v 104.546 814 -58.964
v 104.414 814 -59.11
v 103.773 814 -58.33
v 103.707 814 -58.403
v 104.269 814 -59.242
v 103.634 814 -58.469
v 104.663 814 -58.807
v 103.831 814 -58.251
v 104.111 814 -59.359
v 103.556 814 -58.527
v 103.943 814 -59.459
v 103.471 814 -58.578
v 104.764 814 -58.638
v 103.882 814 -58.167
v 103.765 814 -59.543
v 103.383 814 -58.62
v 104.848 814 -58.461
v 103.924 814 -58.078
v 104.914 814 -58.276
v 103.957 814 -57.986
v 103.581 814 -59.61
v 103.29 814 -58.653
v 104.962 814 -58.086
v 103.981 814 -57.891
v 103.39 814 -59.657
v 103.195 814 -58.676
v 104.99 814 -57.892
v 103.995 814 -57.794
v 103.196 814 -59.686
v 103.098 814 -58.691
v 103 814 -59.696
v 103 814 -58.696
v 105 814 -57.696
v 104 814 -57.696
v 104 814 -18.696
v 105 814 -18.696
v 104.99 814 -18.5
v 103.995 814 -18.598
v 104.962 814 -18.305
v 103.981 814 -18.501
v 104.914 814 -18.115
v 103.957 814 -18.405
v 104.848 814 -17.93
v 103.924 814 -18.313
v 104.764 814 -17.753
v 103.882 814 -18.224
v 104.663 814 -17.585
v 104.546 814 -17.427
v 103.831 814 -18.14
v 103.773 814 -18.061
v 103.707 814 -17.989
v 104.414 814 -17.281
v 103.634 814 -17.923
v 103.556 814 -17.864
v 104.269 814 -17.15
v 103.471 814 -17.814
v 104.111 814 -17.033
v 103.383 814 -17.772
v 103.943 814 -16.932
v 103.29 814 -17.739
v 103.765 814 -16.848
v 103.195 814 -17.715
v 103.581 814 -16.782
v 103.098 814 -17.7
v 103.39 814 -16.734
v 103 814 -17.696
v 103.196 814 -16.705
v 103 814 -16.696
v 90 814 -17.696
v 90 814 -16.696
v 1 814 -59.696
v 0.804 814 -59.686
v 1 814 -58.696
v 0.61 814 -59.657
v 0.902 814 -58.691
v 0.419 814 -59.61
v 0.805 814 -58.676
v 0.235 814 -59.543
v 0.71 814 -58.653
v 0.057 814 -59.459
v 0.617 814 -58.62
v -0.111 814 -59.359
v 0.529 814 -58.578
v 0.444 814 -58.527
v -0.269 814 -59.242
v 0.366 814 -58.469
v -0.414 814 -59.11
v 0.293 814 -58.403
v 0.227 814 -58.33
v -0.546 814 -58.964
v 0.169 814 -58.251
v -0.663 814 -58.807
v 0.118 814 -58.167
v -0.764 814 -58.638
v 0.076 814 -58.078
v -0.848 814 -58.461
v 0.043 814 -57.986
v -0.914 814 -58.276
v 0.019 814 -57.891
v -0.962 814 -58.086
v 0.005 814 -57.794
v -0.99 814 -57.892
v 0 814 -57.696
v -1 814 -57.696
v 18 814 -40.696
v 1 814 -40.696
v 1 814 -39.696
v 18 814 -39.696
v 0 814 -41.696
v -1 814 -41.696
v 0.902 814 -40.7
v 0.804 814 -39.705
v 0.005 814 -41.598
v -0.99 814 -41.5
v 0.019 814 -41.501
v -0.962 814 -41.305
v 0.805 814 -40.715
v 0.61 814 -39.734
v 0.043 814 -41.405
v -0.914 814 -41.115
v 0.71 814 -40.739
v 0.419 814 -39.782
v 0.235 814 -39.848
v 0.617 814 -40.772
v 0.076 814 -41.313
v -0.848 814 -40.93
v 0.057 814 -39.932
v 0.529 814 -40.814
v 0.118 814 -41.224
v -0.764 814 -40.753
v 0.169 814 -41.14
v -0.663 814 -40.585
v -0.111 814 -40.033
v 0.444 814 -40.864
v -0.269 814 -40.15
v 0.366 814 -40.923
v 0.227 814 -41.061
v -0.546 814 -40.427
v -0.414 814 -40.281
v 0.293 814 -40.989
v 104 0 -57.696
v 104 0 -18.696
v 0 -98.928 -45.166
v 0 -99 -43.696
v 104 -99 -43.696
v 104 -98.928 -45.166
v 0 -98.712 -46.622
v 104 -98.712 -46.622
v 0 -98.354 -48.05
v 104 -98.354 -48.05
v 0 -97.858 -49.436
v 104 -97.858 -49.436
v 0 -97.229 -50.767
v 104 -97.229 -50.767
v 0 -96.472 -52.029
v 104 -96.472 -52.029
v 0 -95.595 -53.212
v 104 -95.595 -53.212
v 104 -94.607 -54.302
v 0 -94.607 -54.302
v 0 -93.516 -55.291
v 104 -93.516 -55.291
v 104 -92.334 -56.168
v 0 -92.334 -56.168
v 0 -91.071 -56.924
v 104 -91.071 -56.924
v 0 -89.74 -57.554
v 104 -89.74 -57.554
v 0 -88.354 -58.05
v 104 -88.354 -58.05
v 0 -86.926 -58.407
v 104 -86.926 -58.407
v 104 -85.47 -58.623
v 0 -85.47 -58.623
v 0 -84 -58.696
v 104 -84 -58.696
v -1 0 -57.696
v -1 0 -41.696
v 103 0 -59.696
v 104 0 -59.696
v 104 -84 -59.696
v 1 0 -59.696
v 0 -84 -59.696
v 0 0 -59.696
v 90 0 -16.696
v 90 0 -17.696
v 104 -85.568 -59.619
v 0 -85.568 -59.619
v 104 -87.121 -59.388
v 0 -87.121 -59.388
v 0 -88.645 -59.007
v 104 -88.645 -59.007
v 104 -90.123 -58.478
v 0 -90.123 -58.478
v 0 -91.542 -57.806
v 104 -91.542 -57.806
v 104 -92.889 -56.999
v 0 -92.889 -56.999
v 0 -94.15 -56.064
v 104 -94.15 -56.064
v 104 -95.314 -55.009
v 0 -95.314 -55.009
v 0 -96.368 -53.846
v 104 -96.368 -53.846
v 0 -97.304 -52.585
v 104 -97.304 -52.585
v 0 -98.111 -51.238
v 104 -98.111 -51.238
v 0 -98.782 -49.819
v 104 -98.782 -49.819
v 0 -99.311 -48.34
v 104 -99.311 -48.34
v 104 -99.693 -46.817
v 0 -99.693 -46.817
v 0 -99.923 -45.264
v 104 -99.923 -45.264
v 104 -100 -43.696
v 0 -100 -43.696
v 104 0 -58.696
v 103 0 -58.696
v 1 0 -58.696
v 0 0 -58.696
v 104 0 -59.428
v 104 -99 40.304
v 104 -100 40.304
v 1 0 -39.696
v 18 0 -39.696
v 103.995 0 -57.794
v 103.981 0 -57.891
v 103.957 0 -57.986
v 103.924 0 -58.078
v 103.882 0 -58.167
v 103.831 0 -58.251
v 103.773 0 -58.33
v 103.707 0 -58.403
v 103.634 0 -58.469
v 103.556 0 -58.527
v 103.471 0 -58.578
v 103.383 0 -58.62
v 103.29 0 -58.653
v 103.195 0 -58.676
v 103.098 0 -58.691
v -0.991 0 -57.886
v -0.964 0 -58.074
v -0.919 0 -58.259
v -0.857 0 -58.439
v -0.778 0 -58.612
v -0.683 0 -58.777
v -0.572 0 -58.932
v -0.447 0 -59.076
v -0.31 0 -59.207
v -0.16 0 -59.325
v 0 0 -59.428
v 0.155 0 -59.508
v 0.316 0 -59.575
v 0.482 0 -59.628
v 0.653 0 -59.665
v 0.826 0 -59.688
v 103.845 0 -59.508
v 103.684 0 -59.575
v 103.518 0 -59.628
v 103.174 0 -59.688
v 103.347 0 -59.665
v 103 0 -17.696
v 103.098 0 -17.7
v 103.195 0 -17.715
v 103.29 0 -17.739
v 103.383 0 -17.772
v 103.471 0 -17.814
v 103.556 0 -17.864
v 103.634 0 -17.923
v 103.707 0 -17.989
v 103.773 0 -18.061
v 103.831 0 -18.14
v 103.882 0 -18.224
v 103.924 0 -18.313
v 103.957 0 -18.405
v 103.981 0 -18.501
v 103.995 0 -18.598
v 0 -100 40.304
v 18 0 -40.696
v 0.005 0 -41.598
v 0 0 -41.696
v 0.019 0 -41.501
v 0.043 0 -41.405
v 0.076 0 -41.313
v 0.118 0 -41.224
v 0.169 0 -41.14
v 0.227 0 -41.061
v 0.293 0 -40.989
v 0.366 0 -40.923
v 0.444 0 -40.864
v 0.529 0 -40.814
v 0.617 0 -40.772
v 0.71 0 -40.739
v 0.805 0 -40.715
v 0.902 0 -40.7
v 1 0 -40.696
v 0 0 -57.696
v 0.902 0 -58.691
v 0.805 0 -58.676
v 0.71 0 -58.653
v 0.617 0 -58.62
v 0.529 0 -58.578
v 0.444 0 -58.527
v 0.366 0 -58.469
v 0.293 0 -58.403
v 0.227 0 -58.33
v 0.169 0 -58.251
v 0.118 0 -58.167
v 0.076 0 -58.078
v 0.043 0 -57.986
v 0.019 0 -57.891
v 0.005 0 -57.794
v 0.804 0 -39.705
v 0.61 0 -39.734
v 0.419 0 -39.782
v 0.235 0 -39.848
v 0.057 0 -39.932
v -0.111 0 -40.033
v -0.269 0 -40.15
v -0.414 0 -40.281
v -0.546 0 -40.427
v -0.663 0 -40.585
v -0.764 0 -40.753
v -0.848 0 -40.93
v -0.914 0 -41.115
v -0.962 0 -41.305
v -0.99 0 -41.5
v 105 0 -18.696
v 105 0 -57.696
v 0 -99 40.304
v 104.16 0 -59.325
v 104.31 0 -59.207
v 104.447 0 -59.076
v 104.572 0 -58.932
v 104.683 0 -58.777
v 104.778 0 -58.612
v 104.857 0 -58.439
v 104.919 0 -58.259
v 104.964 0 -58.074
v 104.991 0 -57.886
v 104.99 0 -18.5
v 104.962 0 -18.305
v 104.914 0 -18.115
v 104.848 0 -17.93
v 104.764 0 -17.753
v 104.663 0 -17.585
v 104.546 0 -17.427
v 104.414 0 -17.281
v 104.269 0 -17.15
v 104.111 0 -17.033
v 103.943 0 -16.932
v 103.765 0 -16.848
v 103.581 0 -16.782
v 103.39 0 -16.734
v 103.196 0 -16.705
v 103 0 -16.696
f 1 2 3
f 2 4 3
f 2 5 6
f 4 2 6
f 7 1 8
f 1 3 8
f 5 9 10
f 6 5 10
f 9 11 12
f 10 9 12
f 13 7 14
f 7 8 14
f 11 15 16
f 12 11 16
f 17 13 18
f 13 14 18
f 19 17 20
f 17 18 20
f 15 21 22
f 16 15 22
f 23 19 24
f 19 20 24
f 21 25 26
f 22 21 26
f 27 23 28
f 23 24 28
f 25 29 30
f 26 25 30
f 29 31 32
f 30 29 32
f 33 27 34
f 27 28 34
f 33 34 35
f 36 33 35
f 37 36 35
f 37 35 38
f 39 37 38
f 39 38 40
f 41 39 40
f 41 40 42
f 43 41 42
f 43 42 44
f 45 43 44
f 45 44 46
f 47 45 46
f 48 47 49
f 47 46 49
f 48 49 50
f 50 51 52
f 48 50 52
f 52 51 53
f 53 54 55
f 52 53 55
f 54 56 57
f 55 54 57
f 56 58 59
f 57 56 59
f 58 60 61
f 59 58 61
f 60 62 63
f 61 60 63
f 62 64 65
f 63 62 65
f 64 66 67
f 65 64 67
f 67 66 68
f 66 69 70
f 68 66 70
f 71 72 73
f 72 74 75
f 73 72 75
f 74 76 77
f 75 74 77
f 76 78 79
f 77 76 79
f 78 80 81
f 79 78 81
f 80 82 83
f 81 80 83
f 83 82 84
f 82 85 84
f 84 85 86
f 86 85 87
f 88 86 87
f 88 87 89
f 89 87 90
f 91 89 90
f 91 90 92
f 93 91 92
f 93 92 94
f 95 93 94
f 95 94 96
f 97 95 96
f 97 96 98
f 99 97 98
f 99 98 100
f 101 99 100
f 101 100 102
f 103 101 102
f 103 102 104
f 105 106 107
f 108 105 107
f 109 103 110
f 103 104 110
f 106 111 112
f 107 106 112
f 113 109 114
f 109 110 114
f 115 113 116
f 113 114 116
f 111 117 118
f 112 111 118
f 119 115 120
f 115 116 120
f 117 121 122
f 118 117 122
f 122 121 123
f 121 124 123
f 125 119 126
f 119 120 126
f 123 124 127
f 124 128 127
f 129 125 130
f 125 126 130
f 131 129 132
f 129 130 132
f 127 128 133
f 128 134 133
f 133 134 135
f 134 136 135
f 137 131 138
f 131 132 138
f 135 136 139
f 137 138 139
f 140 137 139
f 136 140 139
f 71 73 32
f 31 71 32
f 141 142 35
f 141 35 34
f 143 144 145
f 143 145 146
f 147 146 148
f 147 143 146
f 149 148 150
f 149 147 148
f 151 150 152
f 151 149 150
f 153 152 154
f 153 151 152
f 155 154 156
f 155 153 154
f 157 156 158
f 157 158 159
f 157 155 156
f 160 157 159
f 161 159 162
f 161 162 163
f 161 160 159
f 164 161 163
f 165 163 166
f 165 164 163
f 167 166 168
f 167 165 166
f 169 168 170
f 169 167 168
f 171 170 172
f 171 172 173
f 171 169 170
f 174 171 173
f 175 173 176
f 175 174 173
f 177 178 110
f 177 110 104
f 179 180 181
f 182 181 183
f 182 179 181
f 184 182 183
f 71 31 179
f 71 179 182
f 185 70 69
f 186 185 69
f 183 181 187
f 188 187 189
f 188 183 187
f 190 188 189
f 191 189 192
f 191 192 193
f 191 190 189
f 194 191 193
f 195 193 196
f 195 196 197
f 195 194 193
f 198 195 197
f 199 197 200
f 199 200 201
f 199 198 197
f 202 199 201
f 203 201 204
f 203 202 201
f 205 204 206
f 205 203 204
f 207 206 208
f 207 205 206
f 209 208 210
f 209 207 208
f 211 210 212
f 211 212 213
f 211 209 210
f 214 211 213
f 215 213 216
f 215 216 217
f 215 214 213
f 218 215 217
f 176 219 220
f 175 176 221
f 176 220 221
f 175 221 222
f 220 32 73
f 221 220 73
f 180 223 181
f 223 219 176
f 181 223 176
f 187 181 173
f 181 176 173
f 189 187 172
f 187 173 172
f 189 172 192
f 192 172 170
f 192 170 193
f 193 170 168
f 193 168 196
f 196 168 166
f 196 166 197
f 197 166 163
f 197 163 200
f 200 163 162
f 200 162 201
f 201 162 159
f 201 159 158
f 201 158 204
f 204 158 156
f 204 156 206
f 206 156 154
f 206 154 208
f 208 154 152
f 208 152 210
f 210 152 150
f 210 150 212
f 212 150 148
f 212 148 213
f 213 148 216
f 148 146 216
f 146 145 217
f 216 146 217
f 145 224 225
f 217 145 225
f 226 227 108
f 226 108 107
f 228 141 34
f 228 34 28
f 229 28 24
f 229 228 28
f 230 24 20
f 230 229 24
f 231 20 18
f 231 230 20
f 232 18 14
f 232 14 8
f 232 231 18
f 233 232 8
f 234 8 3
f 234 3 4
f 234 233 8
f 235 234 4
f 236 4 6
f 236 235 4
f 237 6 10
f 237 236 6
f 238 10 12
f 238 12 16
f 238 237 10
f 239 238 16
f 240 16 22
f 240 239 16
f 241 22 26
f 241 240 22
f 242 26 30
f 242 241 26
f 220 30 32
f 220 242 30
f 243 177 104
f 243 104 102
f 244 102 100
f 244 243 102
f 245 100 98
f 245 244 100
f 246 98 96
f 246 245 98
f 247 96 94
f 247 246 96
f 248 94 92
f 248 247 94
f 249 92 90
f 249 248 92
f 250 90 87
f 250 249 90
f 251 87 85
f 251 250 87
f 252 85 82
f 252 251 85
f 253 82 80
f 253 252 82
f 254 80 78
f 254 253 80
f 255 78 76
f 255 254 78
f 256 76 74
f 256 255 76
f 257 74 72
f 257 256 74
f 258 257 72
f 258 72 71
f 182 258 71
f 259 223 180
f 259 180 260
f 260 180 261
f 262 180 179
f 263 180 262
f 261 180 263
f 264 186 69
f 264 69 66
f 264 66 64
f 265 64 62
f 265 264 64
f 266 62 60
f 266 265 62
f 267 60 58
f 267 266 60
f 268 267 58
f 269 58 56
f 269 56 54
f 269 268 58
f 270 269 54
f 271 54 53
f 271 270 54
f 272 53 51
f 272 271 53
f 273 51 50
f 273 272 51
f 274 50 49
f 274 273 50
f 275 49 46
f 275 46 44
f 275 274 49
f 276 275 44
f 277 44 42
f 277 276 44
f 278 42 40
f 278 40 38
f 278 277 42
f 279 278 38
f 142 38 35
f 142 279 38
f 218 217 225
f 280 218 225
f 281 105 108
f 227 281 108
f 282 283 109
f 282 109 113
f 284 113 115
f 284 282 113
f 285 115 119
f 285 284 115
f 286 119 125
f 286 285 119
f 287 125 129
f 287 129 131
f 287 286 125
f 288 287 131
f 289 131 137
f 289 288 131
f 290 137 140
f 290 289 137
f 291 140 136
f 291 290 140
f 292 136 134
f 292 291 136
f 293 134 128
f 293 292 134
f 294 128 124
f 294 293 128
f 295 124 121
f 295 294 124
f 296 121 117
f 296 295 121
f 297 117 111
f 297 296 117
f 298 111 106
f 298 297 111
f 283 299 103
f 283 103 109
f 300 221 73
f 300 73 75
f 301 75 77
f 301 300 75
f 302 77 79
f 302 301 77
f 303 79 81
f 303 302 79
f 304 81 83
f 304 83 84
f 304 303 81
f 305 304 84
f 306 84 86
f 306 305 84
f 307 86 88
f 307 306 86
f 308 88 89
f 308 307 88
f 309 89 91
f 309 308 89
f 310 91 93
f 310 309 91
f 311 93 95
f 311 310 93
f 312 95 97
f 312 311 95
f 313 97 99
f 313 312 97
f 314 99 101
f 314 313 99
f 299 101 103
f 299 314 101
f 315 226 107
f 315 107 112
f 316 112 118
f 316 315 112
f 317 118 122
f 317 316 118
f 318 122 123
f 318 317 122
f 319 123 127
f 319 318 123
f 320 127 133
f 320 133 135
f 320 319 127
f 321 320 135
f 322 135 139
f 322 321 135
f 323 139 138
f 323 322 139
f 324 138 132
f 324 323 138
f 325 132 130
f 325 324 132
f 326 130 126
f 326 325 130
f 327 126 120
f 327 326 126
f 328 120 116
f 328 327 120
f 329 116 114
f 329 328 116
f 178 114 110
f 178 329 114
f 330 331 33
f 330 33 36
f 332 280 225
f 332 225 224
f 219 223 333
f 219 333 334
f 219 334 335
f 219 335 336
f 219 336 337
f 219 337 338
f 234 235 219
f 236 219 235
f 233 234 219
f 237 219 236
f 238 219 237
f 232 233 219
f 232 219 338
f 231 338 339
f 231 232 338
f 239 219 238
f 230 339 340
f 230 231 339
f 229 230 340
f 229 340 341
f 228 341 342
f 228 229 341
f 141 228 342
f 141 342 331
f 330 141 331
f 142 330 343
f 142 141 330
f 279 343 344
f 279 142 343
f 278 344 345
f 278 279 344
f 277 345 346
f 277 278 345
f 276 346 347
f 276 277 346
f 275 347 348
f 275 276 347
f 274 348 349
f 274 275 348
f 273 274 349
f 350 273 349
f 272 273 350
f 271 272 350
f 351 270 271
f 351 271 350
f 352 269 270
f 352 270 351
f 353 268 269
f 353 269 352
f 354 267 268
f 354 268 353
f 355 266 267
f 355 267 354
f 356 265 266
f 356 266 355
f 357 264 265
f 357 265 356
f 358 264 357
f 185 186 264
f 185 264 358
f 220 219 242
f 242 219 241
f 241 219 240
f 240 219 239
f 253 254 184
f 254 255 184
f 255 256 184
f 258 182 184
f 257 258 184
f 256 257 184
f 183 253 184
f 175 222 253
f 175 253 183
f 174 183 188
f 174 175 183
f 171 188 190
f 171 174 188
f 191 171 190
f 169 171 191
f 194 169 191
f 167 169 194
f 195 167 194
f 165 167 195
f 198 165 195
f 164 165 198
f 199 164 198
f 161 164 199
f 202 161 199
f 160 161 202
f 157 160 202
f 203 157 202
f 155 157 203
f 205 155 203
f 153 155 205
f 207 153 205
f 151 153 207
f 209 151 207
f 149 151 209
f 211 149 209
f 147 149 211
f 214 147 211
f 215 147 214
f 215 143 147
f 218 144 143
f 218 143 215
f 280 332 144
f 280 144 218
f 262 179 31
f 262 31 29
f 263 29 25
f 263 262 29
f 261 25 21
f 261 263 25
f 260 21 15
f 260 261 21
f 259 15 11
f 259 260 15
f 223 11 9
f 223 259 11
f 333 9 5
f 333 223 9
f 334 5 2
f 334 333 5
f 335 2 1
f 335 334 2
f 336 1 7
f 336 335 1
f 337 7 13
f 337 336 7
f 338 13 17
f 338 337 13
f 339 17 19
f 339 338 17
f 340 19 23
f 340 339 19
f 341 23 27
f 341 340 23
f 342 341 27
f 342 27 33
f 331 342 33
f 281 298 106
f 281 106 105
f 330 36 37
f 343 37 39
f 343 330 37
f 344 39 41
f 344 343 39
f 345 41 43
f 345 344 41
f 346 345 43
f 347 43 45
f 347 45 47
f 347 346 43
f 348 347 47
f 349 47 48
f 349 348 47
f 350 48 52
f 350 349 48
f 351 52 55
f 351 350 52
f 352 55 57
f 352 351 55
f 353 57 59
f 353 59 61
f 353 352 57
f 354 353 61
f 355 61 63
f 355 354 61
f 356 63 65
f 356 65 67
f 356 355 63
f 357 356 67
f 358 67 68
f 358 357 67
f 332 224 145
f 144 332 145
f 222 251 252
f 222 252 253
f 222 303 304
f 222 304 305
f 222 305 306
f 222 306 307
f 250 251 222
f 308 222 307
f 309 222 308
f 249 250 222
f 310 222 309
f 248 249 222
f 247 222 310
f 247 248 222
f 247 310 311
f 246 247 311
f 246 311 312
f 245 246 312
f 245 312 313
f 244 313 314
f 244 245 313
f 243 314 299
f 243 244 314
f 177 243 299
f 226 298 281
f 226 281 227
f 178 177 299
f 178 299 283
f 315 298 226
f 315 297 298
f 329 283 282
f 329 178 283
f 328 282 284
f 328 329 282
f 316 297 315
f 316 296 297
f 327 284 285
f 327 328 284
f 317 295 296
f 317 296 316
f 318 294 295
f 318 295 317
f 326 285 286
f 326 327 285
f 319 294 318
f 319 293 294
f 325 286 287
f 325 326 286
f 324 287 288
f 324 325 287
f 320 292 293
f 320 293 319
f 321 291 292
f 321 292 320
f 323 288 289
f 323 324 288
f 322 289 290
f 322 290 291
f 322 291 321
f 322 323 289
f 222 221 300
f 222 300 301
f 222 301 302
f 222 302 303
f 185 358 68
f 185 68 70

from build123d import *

# Parameters (mm, degrees)
BASE_FLANGE1_DEPTH = 814
EDGE_FLANGE1_DEPTH = 814
SKETCH15_W         = 104
SKETCH15_H         = 84
TAB1_DEPTH         = 1
EDGE_FLANGE2_DEPTH = 104


# Sheet-metal steps are written as plain solids
with BuildPart() as part:
    # Sketch1 → Base-Flange1 (new body)
    with BuildSketch(Plane(origin=(0, 0, 0), x_dir=(1, 0, 0), z_dir=(0, 1, 0))):
        with BuildLine():
            Line((104, 18.695652174), (104, 57.695652174))
            ThreePointArc((104, 57.695652174), (103.707106781, 58.402758955), (103, 58.695652174))
            Line((103, 58.695652174), (1, 58.695652174))
            ThreePointArc((1, 58.695652174), (0.292893219, 58.402758955), (0, 57.695652174))
            Line((0, 57.695652174), (0, 41.695652174))
            ThreePointArc((0, 41.695652174), (0.292893219, 40.988545393), (1, 40.695652174))
            Line((1, 40.695652174), (18, 40.695652174))
            Line((18, 40.695652174), (18, 39.695652174))
            Line((18, 39.695652174), (1, 39.695652174))
            ThreePointArc((1, 39.695652174), (-0.414213562, 40.281438612), (-1, 41.695652174))
            Line((-1, 41.695652174), (-1, 57.695652174))
            ThreePointArc((-1, 57.695652174), (-0.414213562, 59.109865736), (1, 59.695652174))
            Line((1, 59.695652174), (103, 59.695652174))
            ThreePointArc((103, 59.695652174), (104.414213562, 59.109865736), (105, 57.695652174))
            Line((105, 57.695652174), (105, 18.695652174))
            Line((105, 18.695652174), (104, 18.695652174))
        make_face()
    extrude(amount=BASE_FLANGE1_DEPTH)

    # Edge-Flange1 section (across the edge) → Edge-Flange1 (add)
    with BuildSketch(Plane(origin=(104, 0, -17.695652174), x_dir=(0, 0, -1), z_dir=(0, 1, 0))):
        with BuildLine():
            Line((-1, 1), (-1, 14))
            Line((-1, 14), (0, 14))
            Line((0, 14), (0, 1))
            ThreePointArc((0, 1), (0.292893219, 0.292893219), (1, 0))
            Line((1, 0), (1, -1))
            ThreePointArc((1, -1), (-0.414213562, -0.414213562), (-1, 1))
        make_face()
    extrude(amount=EDGE_FLANGE1_DEPTH)

    # Sketch15 → Tab1 (add)
    with BuildSketch(Plane(origin=(0, 0, -59.695652174), x_dir=(-1, 0, 0), z_dir=(0, 0, -1))):
        with Locations((-52, -42)):
            Rectangle(SKETCH15_W, SKETCH15_H)
    extrude(amount=-TAB1_DEPTH)

    # Edge-Flange2 section (across the edge) → Edge-Flange2 (add)
    with BuildSketch(Plane(origin=(0, -99, -58.695652174), x_dir=(0, 1, 0), z_dir=(1, 0, 0))):
        with BuildLine():
            Line((-1, 15), (-1, 99))
            Line((-1, 99), (0, 99))
            Line((0, 99), (0, 15))
            ThreePointArc((0, 15), (4.393398282, 4.393398282), (15, 0))
            Line((15, 0), (15, -1))
            ThreePointArc((15, -1), (3.686291501, 3.686291501), (-1, 15))
        make_face()
    extrude(amount=EDGE_FLANGE2_DEPTH)


solid = part.part
